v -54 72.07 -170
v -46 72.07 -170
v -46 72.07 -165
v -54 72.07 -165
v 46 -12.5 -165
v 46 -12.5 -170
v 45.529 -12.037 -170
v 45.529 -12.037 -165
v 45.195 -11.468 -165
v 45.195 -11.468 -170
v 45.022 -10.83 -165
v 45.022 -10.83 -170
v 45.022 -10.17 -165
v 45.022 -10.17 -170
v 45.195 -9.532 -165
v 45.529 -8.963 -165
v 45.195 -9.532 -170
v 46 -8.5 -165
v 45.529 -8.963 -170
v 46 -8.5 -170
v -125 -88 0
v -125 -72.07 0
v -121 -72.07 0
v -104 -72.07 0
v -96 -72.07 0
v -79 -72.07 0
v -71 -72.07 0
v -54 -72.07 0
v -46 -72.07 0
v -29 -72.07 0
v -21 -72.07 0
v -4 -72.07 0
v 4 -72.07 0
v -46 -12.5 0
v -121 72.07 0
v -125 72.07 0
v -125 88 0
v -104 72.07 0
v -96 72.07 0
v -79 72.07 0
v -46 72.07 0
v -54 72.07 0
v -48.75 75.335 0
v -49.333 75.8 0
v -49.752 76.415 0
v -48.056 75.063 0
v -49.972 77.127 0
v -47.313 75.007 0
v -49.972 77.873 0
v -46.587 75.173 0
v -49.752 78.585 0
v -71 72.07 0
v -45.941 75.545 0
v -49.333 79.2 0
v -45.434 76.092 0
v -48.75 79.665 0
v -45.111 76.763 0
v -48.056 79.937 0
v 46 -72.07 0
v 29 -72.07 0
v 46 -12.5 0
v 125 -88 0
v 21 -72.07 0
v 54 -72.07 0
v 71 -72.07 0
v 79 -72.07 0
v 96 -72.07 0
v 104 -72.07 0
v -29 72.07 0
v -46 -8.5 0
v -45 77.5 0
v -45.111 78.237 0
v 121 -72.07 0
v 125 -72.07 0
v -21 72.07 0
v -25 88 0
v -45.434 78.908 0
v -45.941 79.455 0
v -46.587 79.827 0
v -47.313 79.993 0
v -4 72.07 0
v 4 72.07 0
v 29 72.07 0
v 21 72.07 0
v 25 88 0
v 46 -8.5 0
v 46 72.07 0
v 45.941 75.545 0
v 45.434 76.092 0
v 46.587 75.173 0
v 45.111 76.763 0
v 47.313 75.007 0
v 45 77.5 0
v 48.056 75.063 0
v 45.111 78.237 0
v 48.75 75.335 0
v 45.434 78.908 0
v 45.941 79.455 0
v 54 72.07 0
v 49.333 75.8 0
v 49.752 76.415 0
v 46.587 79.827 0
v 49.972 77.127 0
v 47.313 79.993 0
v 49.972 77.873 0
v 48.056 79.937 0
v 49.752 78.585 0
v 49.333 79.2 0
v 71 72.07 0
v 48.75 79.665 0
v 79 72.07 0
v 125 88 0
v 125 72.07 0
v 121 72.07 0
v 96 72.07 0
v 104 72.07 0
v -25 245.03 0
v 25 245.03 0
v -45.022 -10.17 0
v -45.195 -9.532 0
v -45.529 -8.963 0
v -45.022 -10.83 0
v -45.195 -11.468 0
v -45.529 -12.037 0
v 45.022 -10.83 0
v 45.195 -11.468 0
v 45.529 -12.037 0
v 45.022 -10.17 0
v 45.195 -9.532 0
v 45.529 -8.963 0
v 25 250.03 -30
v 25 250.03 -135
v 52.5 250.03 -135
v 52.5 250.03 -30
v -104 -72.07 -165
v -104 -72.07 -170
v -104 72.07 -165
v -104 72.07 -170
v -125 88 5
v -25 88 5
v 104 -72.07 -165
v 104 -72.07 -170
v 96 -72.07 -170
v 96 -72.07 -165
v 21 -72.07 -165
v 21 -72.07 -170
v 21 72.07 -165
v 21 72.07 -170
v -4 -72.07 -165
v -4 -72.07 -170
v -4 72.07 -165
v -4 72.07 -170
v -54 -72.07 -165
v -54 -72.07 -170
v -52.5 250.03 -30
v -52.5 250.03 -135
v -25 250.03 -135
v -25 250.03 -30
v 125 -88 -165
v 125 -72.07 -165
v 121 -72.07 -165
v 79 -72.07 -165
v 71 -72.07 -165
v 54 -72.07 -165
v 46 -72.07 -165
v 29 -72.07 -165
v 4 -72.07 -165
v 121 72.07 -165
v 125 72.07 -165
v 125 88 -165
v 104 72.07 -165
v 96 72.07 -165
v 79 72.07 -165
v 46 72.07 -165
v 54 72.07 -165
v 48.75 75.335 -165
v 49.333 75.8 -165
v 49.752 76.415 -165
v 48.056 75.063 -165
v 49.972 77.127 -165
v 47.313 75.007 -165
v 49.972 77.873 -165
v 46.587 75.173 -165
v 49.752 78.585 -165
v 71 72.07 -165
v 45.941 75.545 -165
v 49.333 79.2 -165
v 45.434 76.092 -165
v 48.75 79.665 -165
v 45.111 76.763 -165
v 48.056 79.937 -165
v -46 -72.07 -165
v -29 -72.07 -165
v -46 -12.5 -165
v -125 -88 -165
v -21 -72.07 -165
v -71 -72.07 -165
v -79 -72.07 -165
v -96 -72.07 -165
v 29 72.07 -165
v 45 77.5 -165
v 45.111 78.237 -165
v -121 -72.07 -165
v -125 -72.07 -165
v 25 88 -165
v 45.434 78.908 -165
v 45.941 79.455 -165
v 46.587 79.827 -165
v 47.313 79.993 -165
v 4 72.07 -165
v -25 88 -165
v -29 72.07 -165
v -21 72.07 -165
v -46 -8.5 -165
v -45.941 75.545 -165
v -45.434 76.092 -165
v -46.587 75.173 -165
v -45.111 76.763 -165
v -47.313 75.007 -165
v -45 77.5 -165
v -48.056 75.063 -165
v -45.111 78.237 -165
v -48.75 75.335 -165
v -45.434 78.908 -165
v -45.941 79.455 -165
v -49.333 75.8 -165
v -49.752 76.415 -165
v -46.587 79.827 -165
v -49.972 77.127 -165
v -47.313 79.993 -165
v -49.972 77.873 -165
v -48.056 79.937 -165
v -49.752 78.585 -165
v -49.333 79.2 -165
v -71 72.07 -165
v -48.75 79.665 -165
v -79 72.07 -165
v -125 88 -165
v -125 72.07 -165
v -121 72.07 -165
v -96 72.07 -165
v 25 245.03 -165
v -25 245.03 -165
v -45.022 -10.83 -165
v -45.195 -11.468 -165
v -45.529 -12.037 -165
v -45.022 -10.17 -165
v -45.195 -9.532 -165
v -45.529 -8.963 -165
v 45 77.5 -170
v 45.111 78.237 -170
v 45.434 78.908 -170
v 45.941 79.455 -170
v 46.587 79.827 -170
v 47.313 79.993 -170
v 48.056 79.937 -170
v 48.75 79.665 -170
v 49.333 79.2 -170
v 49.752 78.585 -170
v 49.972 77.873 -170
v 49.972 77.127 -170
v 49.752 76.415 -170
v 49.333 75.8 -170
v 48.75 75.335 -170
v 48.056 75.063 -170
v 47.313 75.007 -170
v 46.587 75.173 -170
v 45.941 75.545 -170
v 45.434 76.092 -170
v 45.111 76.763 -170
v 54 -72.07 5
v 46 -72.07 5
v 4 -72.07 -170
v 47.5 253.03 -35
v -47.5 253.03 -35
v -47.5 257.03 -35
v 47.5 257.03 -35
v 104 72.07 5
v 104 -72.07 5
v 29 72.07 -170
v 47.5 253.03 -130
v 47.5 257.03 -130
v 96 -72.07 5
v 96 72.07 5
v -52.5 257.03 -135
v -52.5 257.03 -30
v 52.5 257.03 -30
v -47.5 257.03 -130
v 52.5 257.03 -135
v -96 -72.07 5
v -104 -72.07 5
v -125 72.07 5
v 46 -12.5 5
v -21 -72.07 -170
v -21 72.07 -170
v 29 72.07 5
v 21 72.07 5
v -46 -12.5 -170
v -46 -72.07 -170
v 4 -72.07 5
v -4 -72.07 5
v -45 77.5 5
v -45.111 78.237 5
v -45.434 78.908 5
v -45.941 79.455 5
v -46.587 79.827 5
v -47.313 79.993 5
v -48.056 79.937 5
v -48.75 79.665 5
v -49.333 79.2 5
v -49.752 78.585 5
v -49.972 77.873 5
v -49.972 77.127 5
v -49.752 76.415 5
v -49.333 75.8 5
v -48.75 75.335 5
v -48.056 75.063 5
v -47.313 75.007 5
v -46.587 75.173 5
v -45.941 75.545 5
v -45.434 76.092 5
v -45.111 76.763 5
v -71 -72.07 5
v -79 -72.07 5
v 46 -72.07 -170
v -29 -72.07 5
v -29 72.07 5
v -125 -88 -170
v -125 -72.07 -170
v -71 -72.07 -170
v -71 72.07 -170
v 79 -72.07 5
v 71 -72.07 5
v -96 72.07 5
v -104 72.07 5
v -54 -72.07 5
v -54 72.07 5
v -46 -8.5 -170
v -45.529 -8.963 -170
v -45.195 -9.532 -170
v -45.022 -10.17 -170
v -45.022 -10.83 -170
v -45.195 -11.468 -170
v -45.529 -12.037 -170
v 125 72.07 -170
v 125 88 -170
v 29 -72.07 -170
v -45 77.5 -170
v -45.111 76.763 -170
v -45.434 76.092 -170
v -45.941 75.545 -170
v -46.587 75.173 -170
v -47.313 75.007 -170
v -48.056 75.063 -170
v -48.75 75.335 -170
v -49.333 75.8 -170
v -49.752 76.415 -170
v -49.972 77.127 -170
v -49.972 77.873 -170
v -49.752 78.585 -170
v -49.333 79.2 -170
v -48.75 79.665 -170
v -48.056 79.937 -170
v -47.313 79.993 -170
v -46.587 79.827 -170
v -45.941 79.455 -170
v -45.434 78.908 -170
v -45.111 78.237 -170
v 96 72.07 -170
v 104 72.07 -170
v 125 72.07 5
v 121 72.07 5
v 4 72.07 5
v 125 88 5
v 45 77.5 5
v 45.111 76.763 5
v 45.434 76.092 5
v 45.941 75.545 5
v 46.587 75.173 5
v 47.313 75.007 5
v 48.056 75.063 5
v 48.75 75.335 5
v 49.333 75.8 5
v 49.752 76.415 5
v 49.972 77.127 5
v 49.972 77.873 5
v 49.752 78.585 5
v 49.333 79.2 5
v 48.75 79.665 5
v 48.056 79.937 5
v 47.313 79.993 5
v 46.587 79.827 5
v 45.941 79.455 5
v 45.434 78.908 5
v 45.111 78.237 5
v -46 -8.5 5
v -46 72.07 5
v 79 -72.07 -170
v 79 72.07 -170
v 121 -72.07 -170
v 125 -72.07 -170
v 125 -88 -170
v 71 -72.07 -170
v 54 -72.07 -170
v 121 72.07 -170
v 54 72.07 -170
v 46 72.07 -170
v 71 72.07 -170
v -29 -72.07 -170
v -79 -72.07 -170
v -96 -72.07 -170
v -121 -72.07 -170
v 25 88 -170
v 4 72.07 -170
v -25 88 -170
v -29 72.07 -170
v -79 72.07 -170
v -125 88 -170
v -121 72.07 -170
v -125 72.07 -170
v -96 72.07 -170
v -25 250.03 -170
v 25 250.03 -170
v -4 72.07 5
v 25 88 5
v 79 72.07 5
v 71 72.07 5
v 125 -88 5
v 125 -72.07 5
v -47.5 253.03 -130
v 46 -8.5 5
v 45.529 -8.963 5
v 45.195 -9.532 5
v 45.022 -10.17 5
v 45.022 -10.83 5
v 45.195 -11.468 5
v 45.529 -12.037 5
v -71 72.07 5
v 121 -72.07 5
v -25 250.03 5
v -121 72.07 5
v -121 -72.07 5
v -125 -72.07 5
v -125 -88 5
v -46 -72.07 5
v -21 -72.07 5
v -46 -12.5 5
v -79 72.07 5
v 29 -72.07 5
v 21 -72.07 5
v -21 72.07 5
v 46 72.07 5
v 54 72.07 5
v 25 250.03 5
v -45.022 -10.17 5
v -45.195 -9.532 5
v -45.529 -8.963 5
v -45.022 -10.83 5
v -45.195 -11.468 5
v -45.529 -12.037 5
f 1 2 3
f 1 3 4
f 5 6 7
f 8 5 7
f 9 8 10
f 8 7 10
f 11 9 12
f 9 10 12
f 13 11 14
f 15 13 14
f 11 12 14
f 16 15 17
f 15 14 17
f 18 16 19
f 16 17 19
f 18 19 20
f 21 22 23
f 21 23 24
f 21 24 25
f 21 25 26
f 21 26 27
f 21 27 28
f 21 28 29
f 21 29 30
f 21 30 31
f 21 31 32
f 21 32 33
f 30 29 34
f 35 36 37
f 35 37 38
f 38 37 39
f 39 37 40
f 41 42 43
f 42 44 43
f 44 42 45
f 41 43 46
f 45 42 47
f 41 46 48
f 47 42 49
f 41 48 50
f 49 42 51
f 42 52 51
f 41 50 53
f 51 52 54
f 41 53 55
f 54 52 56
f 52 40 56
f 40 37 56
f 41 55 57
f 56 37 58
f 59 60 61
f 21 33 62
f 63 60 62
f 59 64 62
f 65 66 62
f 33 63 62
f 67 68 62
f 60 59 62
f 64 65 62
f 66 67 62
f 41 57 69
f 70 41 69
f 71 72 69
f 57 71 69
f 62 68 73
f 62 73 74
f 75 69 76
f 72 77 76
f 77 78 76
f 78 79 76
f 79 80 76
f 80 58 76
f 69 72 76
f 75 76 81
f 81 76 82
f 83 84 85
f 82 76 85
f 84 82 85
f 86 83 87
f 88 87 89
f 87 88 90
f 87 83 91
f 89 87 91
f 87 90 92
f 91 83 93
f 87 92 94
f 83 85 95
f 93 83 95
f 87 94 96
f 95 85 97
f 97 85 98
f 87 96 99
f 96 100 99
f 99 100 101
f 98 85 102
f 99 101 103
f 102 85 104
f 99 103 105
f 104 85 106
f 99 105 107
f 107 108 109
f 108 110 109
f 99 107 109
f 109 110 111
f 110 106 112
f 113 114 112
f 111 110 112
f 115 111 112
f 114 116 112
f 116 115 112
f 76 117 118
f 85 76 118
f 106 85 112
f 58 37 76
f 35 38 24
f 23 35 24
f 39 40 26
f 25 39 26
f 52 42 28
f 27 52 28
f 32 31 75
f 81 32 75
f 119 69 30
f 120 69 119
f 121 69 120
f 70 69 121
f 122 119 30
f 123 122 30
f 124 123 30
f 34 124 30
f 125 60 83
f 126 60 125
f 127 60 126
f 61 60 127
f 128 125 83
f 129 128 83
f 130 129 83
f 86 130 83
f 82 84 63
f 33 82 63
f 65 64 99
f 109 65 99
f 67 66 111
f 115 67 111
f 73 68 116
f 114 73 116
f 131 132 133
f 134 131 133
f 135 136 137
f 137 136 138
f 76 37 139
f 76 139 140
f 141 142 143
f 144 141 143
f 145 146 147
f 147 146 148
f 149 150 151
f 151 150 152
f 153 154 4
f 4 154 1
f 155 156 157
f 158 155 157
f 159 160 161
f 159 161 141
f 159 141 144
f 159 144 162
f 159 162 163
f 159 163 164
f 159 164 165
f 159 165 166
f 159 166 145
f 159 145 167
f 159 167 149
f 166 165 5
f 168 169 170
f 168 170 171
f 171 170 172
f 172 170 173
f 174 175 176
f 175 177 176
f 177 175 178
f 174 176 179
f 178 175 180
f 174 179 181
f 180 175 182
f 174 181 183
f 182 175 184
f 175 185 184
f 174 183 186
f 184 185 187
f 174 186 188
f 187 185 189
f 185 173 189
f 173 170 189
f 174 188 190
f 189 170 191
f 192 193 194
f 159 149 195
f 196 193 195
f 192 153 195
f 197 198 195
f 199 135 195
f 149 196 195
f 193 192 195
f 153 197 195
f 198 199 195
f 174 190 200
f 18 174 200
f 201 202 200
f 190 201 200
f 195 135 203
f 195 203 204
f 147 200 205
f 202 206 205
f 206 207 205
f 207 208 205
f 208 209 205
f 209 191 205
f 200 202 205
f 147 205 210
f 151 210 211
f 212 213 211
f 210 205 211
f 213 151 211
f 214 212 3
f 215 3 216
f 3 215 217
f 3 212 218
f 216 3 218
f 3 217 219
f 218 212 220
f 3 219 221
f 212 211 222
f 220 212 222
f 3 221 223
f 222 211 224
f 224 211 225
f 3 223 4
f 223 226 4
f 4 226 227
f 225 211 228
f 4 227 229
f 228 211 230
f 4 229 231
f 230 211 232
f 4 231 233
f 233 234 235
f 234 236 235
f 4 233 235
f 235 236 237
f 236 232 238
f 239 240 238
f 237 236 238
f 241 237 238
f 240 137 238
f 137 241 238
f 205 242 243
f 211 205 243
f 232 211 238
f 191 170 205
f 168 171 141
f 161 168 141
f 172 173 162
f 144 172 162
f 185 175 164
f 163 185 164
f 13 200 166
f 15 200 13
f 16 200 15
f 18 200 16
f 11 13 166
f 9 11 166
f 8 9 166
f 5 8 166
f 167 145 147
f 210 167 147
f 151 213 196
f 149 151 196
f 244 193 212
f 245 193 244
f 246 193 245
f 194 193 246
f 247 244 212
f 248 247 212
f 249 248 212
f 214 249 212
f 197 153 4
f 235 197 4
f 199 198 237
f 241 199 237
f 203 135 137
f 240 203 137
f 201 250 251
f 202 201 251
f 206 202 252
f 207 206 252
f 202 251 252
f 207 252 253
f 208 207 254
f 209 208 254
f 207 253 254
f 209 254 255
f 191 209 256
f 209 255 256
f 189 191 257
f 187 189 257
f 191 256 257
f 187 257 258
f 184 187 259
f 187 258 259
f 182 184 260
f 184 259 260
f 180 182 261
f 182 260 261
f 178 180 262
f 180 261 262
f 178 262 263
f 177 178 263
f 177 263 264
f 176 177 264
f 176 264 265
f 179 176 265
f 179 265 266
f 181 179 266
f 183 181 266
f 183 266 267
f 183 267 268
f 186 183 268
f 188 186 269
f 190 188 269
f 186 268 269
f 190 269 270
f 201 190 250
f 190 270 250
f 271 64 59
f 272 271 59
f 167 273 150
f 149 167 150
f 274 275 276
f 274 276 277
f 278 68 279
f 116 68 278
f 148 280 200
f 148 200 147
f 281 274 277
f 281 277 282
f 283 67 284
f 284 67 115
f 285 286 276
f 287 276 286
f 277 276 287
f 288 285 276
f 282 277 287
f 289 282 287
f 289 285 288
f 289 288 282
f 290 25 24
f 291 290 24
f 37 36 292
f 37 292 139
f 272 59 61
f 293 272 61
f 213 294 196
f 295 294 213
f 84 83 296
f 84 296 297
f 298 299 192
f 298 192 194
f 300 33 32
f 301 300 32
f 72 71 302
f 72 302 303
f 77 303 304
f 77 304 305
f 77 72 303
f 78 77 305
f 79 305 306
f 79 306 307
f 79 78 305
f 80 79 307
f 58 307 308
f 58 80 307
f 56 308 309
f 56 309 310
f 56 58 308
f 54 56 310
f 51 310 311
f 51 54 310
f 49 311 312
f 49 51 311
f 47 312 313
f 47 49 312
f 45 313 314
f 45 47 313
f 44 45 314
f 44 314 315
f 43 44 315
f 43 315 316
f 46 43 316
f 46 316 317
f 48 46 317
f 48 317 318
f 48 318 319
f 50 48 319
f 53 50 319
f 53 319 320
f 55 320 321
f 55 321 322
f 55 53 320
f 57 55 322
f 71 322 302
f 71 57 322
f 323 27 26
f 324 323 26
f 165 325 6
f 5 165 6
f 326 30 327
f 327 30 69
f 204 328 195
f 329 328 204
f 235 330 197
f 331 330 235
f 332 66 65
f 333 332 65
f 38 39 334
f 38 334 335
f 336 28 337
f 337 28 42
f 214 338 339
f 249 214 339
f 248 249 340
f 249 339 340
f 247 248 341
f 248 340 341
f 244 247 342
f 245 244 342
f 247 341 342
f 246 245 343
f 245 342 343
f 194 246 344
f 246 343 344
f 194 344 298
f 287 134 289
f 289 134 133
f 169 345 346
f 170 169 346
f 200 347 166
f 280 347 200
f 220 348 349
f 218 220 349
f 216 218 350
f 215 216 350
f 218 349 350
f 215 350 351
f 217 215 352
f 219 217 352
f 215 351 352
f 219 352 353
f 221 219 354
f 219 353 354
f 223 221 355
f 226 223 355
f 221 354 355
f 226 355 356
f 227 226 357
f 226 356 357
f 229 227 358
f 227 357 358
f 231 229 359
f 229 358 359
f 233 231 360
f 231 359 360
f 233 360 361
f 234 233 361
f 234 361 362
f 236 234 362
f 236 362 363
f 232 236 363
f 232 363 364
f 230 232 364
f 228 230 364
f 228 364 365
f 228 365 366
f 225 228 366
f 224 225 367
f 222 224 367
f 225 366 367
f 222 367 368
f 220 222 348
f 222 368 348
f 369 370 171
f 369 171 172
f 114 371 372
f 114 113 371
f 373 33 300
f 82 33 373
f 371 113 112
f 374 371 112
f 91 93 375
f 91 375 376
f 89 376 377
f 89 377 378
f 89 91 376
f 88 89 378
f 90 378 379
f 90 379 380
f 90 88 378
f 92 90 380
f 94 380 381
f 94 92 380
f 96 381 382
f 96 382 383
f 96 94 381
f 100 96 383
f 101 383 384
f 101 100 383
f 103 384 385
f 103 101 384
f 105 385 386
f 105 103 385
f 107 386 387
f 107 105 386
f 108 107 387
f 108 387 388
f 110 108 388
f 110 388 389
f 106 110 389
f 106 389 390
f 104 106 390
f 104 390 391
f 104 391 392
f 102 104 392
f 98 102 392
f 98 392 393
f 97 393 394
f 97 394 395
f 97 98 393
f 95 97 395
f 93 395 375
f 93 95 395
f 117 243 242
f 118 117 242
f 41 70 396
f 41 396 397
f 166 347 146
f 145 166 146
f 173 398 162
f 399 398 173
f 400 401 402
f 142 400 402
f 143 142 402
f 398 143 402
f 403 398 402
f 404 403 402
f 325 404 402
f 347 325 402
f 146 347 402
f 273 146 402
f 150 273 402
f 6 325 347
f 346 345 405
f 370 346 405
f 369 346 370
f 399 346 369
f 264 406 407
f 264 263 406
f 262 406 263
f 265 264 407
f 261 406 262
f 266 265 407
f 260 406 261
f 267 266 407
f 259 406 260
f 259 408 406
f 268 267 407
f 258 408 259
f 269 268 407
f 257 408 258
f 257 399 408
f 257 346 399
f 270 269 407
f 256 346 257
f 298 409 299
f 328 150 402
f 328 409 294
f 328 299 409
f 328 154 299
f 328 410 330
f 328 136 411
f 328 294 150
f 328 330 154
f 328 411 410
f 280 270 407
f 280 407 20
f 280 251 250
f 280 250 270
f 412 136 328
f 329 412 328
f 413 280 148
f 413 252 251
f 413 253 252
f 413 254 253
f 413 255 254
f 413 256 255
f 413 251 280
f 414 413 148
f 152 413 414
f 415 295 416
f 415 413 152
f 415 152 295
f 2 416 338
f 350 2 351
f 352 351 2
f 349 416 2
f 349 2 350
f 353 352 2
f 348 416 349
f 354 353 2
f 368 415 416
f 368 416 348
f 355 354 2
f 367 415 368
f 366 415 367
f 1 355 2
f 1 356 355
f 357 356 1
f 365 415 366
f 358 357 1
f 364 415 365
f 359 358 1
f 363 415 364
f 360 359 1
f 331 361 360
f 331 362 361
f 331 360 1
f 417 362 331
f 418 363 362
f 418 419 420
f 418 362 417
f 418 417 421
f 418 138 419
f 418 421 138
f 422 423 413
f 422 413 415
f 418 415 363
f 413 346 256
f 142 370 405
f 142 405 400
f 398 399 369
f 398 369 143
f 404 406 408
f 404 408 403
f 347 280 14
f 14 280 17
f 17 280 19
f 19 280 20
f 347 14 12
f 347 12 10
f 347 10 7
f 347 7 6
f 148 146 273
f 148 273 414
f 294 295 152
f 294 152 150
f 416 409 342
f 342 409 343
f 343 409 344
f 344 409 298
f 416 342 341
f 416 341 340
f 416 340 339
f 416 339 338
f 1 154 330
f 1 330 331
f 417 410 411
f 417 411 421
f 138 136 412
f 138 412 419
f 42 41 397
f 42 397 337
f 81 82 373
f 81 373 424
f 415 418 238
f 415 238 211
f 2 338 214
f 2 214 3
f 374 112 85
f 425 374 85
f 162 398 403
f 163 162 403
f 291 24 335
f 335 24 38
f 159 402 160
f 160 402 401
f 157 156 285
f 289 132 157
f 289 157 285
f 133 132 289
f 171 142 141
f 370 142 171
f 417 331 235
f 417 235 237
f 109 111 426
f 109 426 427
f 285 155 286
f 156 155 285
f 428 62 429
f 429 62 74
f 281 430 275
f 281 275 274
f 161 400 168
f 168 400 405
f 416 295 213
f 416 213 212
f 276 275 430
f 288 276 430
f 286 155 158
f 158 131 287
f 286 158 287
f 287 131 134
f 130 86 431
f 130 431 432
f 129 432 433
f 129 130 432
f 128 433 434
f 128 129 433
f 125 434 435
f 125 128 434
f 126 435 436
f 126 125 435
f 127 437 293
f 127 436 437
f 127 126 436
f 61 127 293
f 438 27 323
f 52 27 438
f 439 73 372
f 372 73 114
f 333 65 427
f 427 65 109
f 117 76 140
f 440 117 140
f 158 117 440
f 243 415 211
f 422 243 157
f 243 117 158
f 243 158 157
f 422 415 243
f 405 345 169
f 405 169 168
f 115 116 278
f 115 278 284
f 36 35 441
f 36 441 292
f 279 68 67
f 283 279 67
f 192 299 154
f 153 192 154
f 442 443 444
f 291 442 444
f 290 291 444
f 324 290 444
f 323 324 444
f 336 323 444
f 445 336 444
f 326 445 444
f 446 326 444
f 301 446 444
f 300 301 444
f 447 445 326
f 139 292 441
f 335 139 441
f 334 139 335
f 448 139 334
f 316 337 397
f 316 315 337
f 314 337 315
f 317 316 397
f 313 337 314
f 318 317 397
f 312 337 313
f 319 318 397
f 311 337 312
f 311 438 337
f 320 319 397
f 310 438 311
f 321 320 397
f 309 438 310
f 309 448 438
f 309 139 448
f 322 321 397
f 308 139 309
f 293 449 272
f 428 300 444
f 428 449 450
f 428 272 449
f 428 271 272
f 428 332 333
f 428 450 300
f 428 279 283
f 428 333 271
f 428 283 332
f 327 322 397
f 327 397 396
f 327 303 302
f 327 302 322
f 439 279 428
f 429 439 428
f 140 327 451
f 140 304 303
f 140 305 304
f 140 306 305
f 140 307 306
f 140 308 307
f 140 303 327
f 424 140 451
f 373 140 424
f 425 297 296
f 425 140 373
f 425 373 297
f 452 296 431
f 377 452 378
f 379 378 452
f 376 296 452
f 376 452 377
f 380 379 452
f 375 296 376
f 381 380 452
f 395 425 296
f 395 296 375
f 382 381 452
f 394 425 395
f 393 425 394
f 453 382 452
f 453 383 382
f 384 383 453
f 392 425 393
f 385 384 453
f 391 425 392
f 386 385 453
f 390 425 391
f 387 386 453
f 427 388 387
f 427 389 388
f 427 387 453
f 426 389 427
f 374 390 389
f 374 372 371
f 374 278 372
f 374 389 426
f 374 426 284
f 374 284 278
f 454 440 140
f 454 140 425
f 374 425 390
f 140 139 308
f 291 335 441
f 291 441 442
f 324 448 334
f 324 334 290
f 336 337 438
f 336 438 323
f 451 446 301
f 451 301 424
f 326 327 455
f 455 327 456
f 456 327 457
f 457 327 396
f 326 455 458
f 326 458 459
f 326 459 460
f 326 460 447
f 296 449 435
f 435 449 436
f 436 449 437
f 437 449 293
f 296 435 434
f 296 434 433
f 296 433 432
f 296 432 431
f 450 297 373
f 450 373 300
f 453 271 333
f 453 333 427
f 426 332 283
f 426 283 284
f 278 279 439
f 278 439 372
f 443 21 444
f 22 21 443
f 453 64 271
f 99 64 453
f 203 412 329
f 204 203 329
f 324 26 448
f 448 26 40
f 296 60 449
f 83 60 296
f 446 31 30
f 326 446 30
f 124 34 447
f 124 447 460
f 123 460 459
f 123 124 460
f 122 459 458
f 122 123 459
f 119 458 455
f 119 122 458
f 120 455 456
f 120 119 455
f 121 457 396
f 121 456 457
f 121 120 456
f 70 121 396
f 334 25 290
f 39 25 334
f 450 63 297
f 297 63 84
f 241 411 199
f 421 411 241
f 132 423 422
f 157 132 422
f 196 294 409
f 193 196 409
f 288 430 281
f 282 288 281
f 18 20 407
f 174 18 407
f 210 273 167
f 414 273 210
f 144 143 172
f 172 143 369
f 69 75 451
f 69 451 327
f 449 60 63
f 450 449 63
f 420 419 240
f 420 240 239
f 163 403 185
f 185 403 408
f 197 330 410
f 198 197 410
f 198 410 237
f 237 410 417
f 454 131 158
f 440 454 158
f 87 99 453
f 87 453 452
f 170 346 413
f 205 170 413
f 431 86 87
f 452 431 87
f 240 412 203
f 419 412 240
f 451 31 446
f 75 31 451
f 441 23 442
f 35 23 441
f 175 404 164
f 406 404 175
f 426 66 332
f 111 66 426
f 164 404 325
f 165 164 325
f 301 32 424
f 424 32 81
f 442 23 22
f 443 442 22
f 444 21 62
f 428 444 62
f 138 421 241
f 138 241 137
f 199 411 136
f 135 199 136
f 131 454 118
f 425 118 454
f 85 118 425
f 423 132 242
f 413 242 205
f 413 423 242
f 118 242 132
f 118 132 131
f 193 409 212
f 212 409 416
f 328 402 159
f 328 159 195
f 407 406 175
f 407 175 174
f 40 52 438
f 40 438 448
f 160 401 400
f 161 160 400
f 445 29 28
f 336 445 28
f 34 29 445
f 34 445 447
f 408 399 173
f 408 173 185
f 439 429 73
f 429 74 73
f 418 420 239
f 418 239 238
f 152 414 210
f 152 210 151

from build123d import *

# Parameters (mm, degrees)
ESQUISSE1_R                    = 2.5
BOSS_EXTRU_1_DEPTH             = 5
ESQUISSE2_W                    = 50
ESQUISSE2_H                    = 175
BOSS_EXTRU_2_DEPTH             = 5
ESQUISSE3_R                    = 2.5
BOSS_EXTRU_3_DEPTH             = 5
ESQUISSE4_W                    = 105
ESQUISSE4_H                    = 105
BOSS_EXTRU_4_DEPTH             = 3
ESQUISSE5_W                    = 105
ESQUISSE5_H                    = 105
ESQUISSE5_W_2                  = 95
ESQUISSE5_H_2                  = 95
BOSS_EXTRU_5_DEPTH             = 4
ESQUISSE6_W                    = 250
ESQUISSE6_H                    = 176
ESQUISSE6_R                    = 2.5
ESQUISSE6_R_2                  = 2.502271874
ESQUISSE6_R_3                  = 2.696378283
BOSS_EXTRU_6_DEPTH             = 5
BOSS_EXTRU_7_START             = -5
ESQUISSE8_W                    = 250
ESQUISSE8_H                    = 176
ESQUISSE8_R                    = 2.696378283
ESQUISSE8_R_2                  = 2.502271874
ESQUISSE8_R_3                  = 2.5
BOSS_EXTRU_7_DEPTH             = 5
ESQUISSE9_W                    = 8
ESQUISSE9_H                    = 144.140424184
ENL_V_MAT_EXTRU_1_DEPTH        = 296
R_P_TITION_LIN_AIRE1_COUNT     = 6
R_P_TITION_LIN_AIRE1_PITCH     = 25
R_P_TITION_LIN_AIRE1_COL_COUNT = 6
R_P_TITION_LIN_AIRE1_COL_PITCH = 25


with BuildPart() as part:
    # Esquisse1 → Boss.-Extru.1 (new body)
    with BuildSketch(Plane.XY):
        Polygon((-62.5, 88), (-62.5, -88), (62.5, -88), (62.5, 88), (25, 88), (25, 250.03), (-25, 250.03), (-25, 88), align=None)
        with Locations((-47.5, 77.5)):
            Circle(ESQUISSE1_R, mode=Mode.SUBTRACT)
        with Locations((-47.5, -10.5)):
            Circle(ESQUISSE1_R, mode=Mode.SUBTRACT)
        with Locations(Location((47.5, -10.5, 0), (0, 0, 180))):
            Circle(ESQUISSE1_R, mode=Mode.SUBTRACT)
        with Locations(Location((47.5, 77.5, 0), (0, 0, 180))):
            Circle(ESQUISSE1_R, mode=Mode.SUBTRACT)
    extrude(amount=BOSS_EXTRU_1_DEPTH)

    # Esquisse2 → Boss.-Extru.2 (add)
    with BuildSketch(Plane(origin=(0, 250.03, 0), x_dir=(1, 0, 0), z_dir=(0, 1, 0))):
        with Locations((0, 82.5)):
            Rectangle(ESQUISSE2_W, ESQUISSE2_H)
    extrude(amount=-BOSS_EXTRU_2_DEPTH)

    # Esquisse3 → Boss.-Extru.3 (add)
    with BuildSketch(Plane(origin=(0, 0, -170), x_dir=(-1, 0, 0), z_dir=(0, 0, -1))):
        Polygon((25, 88), (25, 250.03), (-25, 250.03), (-25, 88), (-62.5, 88), (-62.5, -88), (62.5, -88), (62.5, 88), align=None)
        with Locations(Location((47.5, -10.5, 0), (0, 0, 180))):
            Circle(ESQUISSE3_R, mode=Mode.SUBTRACT)
        with Locations(Location((47.5, 77.5, 0), (0, 0, 180))):
            Circle(ESQUISSE3_R, mode=Mode.SUBTRACT)
        with Locations((-47.5, 77.5)):
            Circle(ESQUISSE3_R, mode=Mode.SUBTRACT)
        with Locations((-47.5, -10.5)):
            Circle(ESQUISSE3_R, mode=Mode.SUBTRACT)
    extrude(amount=-BOSS_EXTRU_3_DEPTH)

    # Esquisse4 → Boss.-Extru.4 (add)
    with BuildSketch(Plane(origin=(0, 250.03, 0), x_dir=(1, 0, 0), z_dir=(0, 1, 0))):
        with Locations((0, 82.5)):
            Rectangle(ESQUISSE4_W, ESQUISSE4_H)
    extrude(amount=BOSS_EXTRU_4_DEPTH)

    # Esquisse5 → Boss.-Extru.5 (add)
    with BuildSketch(Plane(origin=(0, 253.03, 0), x_dir=(1, 0, 0), z_dir=(0, 1, 0))):
        with Locations((0, 82.5)):
            Rectangle(ESQUISSE5_W, ESQUISSE5_H)
        with Locations((0, 82.5)):
            Rectangle(ESQUISSE5_W_2, ESQUISSE5_H_2, mode=Mode.SUBTRACT)
    extrude(amount=BOSS_EXTRU_5_DEPTH)

    # Esquisse6 → Boss.-Extru.6 (add)
    with BuildSketch(Plane(origin=(0, 0, -170), x_dir=(-1, 0, 0), z_dir=(0, 0, -1))):
        Rectangle(ESQUISSE6_W, ESQUISSE6_H)
        with Locations((-47.5, 77.5)):
            Circle(ESQUISSE6_R, mode=Mode.SUBTRACT)
        with Locations((47.5, 77.5)):
            Circle(ESQUISSE6_R_2, mode=Mode.SUBTRACT)
        with Locations((-47.5, -10.5)):
            Circle(ESQUISSE6_R_3, mode=Mode.SUBTRACT)
        with Locations((47.5, -10.5)):
            Circle(ESQUISSE6_R_3, mode=Mode.SUBTRACT)
    extrude(amount=-BOSS_EXTRU_6_DEPTH)

    # Esquisse8 → Boss.-Extru.7 (add)
    with BuildSketch(Plane.XY.offset(5).offset(BOSS_EXTRU_7_START)):
        Rectangle(ESQUISSE8_W, ESQUISSE8_H)
        with Locations((47.5, -10.5)):
            Circle(ESQUISSE8_R, mode=Mode.SUBTRACT)
        with Locations((-47.5, 77.5)):
            Circle(ESQUISSE8_R_2, mode=Mode.SUBTRACT)
        with Locations(Location((47.5, 77.5, 0), (0, 0, 180))):
            Circle(ESQUISSE8_R_3, mode=Mode.SUBTRACT)
        with Locations((-47.5, -10.5)):
            Circle(ESQUISSE8_R, mode=Mode.SUBTRACT)
    extrude(amount=BOSS_EXTRU_7_DEPTH)

    # Esquisse9 → Enlèv. mat.-Extru.1 (cut)
    with BuildSketch(Plane(origin=(0, 0, -170), x_dir=(-1, 0, 0), z_dir=(0, 0, -1))):
        Rectangle(ESQUISSE9_W, ESQUISSE9_H)
    enl_v_mat_extru_1 = extrude(amount=-ENL_V_MAT_EXTRU_1_DEPTH, mode=Mode.SUBTRACT)

    # Répétition linéaire1: Enlèv. mat.-Extru.1 ×6
    with Locations(*[(-i * R_P_TITION_LIN_AIRE1_PITCH, 0, 0) for i in range(1, R_P_TITION_LIN_AIRE1_COUNT)]):
        add(enl_v_mat_extru_1, mode=Mode.SUBTRACT)

    # Répétition linéaire1 col: Enlèv. mat.-Extru.1 ×6
    with Locations(*[(i * R_P_TITION_LIN_AIRE1_COL_PITCH, 0, 0) for i in range(1, R_P_TITION_LIN_AIRE1_COL_COUNT)]):
        add(enl_v_mat_extru_1, mode=Mode.SUBTRACT)


solid = part.part
